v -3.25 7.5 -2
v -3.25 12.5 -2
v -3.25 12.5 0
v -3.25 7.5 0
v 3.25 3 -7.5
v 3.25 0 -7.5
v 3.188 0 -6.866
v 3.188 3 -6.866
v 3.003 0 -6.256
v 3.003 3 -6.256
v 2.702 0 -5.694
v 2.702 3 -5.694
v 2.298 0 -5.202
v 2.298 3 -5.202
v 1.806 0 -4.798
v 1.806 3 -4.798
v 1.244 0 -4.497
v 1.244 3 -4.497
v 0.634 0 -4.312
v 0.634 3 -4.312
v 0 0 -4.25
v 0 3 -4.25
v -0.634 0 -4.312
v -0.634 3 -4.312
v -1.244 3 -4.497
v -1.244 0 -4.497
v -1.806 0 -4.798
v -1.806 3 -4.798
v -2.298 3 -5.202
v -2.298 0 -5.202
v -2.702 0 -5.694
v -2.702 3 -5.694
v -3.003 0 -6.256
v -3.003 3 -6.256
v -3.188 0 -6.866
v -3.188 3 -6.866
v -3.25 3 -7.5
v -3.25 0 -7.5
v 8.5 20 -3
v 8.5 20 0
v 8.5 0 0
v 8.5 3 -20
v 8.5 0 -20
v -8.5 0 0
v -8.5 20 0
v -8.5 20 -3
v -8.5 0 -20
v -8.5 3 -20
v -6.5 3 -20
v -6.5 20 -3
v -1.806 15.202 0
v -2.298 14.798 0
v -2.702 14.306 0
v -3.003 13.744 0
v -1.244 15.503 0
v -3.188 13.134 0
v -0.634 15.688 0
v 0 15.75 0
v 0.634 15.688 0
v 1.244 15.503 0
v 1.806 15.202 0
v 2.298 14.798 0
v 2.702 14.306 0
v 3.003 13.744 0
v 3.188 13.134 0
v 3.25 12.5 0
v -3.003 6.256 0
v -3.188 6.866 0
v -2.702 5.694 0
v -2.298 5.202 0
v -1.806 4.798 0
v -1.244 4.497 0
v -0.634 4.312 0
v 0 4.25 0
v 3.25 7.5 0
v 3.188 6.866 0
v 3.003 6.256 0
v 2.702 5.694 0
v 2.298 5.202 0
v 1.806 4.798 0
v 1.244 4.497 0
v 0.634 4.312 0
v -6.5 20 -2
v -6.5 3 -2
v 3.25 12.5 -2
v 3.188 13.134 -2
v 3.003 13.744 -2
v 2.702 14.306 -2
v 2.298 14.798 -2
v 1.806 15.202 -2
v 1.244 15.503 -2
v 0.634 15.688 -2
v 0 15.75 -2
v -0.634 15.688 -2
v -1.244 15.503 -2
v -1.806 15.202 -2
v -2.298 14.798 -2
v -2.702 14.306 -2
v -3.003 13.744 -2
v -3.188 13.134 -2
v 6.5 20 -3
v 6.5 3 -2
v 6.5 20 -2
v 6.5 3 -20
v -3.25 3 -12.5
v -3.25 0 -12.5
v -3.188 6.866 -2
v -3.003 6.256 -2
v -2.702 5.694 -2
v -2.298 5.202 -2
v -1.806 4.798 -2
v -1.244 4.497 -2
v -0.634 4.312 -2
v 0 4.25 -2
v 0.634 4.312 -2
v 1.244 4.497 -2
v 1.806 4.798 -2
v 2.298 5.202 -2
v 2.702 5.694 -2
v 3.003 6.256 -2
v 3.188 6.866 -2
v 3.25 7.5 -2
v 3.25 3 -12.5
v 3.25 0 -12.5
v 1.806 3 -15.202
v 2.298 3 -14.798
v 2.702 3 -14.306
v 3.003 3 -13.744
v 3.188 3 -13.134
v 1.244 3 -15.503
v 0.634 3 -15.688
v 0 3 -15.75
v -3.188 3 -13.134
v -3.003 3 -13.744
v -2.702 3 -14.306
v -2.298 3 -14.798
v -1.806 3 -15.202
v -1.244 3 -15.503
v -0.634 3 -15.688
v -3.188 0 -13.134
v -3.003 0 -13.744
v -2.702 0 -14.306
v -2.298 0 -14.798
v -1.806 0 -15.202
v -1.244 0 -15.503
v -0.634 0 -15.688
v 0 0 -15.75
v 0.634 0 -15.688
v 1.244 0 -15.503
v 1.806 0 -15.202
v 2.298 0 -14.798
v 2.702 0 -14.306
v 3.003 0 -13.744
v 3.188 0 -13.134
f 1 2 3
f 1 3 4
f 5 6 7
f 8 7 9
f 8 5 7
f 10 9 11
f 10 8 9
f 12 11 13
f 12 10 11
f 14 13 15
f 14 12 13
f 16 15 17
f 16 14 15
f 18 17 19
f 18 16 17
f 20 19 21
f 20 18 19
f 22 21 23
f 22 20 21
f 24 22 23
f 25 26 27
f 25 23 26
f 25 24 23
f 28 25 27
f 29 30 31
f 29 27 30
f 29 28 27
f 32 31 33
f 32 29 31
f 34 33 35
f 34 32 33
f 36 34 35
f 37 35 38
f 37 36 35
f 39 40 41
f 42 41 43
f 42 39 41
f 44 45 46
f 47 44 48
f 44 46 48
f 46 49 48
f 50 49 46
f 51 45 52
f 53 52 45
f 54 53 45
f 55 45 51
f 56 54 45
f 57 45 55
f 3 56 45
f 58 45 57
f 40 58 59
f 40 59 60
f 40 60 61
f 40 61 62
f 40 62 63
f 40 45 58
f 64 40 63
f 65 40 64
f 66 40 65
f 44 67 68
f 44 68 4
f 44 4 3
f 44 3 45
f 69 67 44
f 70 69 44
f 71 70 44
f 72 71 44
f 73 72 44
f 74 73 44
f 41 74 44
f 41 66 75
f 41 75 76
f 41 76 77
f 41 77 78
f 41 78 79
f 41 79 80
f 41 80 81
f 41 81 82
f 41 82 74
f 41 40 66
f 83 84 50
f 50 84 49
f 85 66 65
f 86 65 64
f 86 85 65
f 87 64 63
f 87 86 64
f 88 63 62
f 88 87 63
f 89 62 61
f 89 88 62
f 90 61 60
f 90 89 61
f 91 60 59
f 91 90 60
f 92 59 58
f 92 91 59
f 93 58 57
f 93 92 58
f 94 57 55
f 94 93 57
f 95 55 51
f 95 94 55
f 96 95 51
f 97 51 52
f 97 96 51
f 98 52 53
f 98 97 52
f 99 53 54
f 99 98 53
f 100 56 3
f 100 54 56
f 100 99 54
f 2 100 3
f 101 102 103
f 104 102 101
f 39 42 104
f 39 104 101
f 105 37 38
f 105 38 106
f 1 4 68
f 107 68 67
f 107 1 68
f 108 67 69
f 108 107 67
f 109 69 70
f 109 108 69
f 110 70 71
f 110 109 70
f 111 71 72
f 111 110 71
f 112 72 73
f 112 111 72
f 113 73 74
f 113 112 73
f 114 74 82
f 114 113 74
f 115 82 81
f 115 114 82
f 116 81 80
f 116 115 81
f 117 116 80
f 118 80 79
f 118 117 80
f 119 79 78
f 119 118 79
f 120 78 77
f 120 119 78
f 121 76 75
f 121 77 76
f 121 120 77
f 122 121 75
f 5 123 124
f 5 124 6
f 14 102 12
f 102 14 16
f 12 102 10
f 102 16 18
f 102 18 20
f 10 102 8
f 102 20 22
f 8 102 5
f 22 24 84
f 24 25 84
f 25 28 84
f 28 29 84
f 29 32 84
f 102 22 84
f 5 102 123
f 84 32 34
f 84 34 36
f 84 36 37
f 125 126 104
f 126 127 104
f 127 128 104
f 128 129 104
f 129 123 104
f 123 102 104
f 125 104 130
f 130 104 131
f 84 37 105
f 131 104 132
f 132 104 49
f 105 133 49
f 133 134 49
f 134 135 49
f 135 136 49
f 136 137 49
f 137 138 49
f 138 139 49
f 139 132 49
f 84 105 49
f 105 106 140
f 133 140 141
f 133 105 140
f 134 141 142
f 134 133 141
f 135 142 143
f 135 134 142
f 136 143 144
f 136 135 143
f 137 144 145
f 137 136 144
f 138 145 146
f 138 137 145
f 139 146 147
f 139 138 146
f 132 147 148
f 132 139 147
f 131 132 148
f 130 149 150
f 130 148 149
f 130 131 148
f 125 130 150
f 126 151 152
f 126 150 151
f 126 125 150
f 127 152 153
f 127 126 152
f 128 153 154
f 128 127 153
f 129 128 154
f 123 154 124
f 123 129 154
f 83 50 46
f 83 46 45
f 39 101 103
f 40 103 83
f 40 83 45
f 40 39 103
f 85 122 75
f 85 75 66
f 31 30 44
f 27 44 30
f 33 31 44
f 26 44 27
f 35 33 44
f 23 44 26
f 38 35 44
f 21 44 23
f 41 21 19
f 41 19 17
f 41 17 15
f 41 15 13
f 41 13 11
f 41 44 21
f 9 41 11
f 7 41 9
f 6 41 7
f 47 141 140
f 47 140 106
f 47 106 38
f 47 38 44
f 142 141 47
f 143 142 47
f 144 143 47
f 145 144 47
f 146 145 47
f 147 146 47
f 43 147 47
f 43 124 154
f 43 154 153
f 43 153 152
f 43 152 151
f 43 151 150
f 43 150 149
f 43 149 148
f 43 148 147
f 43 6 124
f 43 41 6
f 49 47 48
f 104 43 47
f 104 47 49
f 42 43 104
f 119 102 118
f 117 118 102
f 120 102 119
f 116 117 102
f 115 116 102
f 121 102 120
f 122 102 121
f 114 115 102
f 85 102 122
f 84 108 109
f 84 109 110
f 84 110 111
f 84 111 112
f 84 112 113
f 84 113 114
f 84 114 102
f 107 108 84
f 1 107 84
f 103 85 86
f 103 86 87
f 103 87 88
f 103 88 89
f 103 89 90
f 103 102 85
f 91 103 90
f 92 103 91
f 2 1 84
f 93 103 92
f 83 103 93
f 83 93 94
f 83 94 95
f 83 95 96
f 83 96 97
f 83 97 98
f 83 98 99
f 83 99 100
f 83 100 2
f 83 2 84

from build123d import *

# Parameters (mm, degrees)
BODY_DEPTH     = 8.5
SKETCH2_W      = 13
SKETCH2_H      = 17
EXTUSION_DEPTH = 18
HOLE_A_DEPTH   = 29.217902119
HOLE_B_DEPTH   = 17


with BuildPart() as part:
    # Sketch1 → Body (new, symmetric)
    with BuildSketch(Plane(origin=(0, 0, 0), x_dir=(0, 0, -1), z_dir=(1, 0, 0))):
        Polygon((3, 20), (0, 20), (0, 0), (20, 0), (20, 3), align=None)
    extrude(amount=BODY_DEPTH, both=True)

    # Sketch2 → Extusion (cut)
    with BuildSketch(Plane(origin=(0, 0, -20), x_dir=(-1, 0, 0), z_dir=(0, 0, -1))):
        with Locations((0, 11.5)):
            Rectangle(SKETCH2_W, SKETCH2_H)
    extrude(amount=-EXTUSION_DEPTH, mode=Mode.SUBTRACT)

    # Sketch3 → Hole_A (cut, through all)
    with BuildSketch(Plane(origin=(0, 0, -2), x_dir=(-1, 0, 0), z_dir=(0, 0, -1))):
        with BuildLine():
            Line((-3.25, 7.5), (-3.25, 12.5))
            ThreePointArc((-3.25, 12.5), (0, 15.75), (3.25, 12.5))
            Line((3.25, 12.5), (3.25, 7.5))
            ThreePointArc((3.25, 7.5), (0, 4.25), (-3.25, 7.5))
        make_face()
    extrude(amount=-HOLE_A_DEPTH, mode=Mode.SUBTRACT)

    # Sketch4 → Hole_B (cut)
    with BuildSketch(Plane(origin=(0, 3, 0), x_dir=(1, 0, 0), z_dir=(0, 1, 0))):
        with BuildLine():
            Line((-3.25, 7.5), (-3.25, 12.5))
            ThreePointArc((-3.25, 12.5), (0, 15.75), (3.25, 12.5))
            Line((3.25, 12.5), (3.25, 7.5))
            ThreePointArc((3.25, 7.5), (0, 4.25), (-3.25, 7.5))
        make_face()
    extrude(amount=-HOLE_B_DEPTH, mode=Mode.SUBTRACT)


solid = part.part
